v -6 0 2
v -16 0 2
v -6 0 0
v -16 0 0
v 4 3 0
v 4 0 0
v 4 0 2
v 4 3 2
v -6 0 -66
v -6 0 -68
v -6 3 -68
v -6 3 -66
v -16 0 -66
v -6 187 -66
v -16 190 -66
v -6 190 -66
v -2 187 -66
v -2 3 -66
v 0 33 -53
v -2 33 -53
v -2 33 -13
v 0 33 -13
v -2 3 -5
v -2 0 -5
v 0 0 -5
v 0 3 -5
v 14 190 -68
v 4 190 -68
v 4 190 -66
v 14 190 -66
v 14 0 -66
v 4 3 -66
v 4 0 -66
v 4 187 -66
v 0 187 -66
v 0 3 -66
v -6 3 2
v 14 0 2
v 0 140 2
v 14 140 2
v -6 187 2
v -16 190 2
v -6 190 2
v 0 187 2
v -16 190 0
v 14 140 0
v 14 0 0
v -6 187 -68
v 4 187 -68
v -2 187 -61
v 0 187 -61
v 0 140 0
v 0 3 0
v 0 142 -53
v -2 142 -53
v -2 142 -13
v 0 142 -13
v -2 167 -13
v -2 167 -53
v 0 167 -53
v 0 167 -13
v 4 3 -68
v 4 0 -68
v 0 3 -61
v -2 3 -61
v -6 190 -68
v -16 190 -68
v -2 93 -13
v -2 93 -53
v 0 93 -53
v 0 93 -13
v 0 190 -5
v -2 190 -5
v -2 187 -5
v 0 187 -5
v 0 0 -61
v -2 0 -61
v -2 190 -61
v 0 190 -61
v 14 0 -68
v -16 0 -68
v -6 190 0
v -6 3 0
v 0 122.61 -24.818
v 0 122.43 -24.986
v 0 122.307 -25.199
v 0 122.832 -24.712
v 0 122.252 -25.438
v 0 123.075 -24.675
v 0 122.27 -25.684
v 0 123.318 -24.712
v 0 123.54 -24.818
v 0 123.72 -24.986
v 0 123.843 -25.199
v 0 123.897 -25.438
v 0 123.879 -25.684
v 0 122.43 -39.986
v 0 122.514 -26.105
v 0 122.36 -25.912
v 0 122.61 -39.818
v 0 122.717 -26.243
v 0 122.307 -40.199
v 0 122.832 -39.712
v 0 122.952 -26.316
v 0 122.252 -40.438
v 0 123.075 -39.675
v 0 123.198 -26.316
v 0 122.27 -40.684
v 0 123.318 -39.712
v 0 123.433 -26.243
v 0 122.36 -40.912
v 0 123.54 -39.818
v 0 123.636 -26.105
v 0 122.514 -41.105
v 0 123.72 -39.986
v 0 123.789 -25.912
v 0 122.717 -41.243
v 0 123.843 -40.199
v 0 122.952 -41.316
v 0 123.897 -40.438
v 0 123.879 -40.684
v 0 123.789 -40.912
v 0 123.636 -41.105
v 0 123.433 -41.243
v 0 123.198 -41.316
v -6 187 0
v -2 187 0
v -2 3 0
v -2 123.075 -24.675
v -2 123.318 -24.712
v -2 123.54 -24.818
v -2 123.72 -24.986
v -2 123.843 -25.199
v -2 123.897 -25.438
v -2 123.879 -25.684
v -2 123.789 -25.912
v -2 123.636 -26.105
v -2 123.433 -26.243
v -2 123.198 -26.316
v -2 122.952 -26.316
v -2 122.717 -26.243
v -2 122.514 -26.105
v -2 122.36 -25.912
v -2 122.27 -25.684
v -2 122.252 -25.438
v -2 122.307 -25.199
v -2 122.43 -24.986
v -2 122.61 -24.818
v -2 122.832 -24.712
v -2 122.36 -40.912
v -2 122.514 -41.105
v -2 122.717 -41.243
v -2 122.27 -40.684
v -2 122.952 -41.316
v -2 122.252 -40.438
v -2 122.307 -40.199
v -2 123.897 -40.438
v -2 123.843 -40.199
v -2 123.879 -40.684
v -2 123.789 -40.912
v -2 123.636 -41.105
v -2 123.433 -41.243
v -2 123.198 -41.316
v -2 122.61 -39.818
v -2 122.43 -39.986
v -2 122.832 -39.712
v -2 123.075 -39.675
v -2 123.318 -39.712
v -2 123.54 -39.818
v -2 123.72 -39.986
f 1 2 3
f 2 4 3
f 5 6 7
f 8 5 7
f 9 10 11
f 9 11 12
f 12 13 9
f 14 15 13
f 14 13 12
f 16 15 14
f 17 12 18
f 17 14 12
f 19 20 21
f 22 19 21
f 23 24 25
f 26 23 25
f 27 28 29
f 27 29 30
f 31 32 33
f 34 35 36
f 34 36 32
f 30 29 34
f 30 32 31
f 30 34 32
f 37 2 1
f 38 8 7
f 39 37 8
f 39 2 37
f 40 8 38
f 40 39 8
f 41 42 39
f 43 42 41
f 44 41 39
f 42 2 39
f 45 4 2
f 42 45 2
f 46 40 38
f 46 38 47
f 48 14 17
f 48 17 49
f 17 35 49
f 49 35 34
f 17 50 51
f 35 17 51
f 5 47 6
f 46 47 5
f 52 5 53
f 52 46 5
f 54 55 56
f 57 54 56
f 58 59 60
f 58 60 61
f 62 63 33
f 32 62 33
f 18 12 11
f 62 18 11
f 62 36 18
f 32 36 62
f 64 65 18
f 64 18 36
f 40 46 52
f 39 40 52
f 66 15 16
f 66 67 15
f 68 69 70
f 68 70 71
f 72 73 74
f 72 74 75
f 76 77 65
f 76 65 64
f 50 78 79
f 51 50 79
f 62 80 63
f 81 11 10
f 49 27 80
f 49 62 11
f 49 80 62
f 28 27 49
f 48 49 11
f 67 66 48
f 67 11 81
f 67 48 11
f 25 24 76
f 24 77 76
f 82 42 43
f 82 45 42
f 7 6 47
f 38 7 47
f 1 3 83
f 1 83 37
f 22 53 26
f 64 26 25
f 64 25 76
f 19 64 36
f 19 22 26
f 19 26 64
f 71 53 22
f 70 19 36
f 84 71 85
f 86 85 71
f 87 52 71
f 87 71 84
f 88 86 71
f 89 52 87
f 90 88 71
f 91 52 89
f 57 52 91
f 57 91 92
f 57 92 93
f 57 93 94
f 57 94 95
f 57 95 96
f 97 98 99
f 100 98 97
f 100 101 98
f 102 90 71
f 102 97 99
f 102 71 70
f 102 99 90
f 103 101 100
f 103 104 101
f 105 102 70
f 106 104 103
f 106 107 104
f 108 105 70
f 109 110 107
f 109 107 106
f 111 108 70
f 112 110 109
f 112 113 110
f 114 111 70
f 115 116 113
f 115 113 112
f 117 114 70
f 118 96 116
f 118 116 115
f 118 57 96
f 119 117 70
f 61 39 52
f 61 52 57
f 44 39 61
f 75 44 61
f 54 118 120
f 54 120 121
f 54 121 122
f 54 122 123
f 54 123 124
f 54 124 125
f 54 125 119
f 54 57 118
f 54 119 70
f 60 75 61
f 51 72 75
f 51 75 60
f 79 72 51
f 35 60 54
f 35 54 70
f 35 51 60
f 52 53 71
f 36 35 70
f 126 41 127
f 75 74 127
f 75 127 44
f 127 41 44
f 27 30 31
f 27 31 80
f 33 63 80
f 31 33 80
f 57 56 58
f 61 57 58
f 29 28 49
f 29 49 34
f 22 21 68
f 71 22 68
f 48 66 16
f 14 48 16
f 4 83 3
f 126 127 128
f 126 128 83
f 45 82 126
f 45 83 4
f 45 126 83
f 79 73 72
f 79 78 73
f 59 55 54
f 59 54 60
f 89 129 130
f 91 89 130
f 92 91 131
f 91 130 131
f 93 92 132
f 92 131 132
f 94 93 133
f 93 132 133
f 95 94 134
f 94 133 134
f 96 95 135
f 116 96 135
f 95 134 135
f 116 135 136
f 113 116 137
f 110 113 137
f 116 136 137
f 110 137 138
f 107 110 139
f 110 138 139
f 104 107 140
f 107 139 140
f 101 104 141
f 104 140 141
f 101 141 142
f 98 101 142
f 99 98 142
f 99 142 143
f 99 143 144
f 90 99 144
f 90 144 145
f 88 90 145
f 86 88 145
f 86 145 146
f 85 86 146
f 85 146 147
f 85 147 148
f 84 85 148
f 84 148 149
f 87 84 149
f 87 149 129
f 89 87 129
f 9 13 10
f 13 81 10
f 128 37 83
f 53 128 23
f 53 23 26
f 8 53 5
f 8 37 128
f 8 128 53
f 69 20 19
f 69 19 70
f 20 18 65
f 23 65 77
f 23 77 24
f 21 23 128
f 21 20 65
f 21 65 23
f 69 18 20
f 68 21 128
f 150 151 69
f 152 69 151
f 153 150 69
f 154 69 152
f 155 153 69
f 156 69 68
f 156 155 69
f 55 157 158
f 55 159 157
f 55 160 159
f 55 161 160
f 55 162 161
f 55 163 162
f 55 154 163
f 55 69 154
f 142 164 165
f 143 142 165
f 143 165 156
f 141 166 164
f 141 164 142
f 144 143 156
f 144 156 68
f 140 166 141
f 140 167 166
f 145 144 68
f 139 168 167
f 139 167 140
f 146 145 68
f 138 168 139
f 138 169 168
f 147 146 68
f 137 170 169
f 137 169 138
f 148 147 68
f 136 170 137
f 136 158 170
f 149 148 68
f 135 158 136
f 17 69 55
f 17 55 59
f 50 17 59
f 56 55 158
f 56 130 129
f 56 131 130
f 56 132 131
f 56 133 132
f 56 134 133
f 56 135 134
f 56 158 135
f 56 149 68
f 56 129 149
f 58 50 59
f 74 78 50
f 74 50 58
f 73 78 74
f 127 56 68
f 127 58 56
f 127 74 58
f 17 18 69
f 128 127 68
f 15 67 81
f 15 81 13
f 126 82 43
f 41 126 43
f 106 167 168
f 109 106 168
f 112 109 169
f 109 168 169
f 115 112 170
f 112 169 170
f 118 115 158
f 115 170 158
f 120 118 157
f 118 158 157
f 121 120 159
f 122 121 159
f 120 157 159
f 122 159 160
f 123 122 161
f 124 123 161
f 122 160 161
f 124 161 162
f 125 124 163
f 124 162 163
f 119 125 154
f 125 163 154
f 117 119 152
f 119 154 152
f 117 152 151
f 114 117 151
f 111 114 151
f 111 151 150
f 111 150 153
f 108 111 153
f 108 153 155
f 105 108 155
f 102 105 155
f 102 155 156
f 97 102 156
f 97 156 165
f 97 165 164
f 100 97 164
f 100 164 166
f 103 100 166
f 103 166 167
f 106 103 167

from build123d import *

# Parameters (mm, degrees)
BOSS_EXTRUDE1_DEPTH = 95
SKETCH3_W           = 10
SKETCH3_H           = 10
CUT_EXTRUDE2_DEPTH  = 3
SKETCH4_W           = 40
SKETCH4_H           = 25
SKETCH4_H_2         = 60
CUT_EXTRUDE8_DEPTH  = 2
SKETCH5_W           = 14
SKETCH5_H           = 50
CUT_EXTRUDE9_DEPTH  = 2
SKETCH6_R           = 0.825
CUT_EXTRUDE10_DEPTH = 203.435174809


with BuildPart() as part:
    # Sketch1 → Boss-Extrude1 (new body)
    with BuildSketch(Plane(origin=(0, 0, 0), x_dir=(1, 0, 0), z_dir=(0, 1, 0))):
        Polygon((0, 0), (0, 66), (14, 66), (14, 68), (-16, 68), (-16, 66), (-2, 66), (-2, 0), (-16, 0), (-16, -2), (14, -2), (14, 0), align=None)
    extrude(amount=BOSS_EXTRUDE1_DEPTH)

    # Sketch3 → Cut-Extrude2 (cut)
    with BuildSketch(Plane.XZ):
        with Locations((-1, 0)):
            Rectangle(SKETCH3_W, SKETCH3_H)
        with Locations((-1, -66)):
            Rectangle(SKETCH3_W, SKETCH3_H)
    extrude(amount=-CUT_EXTRUDE2_DEPTH, mode=Mode.SUBTRACT)

    # Mirror2: part across plane


with BuildPart() as part_1:
    add(part.part)
    add(part.part.mirror(Plane(origin=(0, 95, 0), x_dir=(0, 0, 1), z_dir=(0, -1, 0))))

    # Sketch4 → Cut-Extrude8 (cut)
    with BuildSketch(Plane.ZY.offset(2)):
        with Locations((-33, 154.5)):
            Rectangle(SKETCH4_W, SKETCH4_H)
        with Locations((-33, 63)):
            Rectangle(SKETCH4_W, SKETCH4_H_2)
    extrude(amount=-CUT_EXTRUDE8_DEPTH, mode=Mode.SUBTRACT)

    # Sketch5 → Cut-Extrude9 (cut)
    with BuildSketch(Plane(origin=(0, 0, 0), x_dir=(-1, 0, 0), z_dir=(0, 0, -1))):
        with Locations((-7, 165)):
            Rectangle(SKETCH5_W, SKETCH5_H)
    extrude(amount=-CUT_EXTRUDE9_DEPTH, mode=Mode.SUBTRACT)

    # Sketch6 → Cut-Extrude10 (cut, through all)
    with BuildSketch(Plane.ZY.offset(2)):
        with Locations((-25.5, 123.074804834)):
            Circle(SKETCH6_R)
        with Locations((-40.5, 123.074804834)):
            Circle(SKETCH6_R)
    extrude(amount=-CUT_EXTRUDE10_DEPTH, mode=Mode.SUBTRACT)


solid = part_1.part
